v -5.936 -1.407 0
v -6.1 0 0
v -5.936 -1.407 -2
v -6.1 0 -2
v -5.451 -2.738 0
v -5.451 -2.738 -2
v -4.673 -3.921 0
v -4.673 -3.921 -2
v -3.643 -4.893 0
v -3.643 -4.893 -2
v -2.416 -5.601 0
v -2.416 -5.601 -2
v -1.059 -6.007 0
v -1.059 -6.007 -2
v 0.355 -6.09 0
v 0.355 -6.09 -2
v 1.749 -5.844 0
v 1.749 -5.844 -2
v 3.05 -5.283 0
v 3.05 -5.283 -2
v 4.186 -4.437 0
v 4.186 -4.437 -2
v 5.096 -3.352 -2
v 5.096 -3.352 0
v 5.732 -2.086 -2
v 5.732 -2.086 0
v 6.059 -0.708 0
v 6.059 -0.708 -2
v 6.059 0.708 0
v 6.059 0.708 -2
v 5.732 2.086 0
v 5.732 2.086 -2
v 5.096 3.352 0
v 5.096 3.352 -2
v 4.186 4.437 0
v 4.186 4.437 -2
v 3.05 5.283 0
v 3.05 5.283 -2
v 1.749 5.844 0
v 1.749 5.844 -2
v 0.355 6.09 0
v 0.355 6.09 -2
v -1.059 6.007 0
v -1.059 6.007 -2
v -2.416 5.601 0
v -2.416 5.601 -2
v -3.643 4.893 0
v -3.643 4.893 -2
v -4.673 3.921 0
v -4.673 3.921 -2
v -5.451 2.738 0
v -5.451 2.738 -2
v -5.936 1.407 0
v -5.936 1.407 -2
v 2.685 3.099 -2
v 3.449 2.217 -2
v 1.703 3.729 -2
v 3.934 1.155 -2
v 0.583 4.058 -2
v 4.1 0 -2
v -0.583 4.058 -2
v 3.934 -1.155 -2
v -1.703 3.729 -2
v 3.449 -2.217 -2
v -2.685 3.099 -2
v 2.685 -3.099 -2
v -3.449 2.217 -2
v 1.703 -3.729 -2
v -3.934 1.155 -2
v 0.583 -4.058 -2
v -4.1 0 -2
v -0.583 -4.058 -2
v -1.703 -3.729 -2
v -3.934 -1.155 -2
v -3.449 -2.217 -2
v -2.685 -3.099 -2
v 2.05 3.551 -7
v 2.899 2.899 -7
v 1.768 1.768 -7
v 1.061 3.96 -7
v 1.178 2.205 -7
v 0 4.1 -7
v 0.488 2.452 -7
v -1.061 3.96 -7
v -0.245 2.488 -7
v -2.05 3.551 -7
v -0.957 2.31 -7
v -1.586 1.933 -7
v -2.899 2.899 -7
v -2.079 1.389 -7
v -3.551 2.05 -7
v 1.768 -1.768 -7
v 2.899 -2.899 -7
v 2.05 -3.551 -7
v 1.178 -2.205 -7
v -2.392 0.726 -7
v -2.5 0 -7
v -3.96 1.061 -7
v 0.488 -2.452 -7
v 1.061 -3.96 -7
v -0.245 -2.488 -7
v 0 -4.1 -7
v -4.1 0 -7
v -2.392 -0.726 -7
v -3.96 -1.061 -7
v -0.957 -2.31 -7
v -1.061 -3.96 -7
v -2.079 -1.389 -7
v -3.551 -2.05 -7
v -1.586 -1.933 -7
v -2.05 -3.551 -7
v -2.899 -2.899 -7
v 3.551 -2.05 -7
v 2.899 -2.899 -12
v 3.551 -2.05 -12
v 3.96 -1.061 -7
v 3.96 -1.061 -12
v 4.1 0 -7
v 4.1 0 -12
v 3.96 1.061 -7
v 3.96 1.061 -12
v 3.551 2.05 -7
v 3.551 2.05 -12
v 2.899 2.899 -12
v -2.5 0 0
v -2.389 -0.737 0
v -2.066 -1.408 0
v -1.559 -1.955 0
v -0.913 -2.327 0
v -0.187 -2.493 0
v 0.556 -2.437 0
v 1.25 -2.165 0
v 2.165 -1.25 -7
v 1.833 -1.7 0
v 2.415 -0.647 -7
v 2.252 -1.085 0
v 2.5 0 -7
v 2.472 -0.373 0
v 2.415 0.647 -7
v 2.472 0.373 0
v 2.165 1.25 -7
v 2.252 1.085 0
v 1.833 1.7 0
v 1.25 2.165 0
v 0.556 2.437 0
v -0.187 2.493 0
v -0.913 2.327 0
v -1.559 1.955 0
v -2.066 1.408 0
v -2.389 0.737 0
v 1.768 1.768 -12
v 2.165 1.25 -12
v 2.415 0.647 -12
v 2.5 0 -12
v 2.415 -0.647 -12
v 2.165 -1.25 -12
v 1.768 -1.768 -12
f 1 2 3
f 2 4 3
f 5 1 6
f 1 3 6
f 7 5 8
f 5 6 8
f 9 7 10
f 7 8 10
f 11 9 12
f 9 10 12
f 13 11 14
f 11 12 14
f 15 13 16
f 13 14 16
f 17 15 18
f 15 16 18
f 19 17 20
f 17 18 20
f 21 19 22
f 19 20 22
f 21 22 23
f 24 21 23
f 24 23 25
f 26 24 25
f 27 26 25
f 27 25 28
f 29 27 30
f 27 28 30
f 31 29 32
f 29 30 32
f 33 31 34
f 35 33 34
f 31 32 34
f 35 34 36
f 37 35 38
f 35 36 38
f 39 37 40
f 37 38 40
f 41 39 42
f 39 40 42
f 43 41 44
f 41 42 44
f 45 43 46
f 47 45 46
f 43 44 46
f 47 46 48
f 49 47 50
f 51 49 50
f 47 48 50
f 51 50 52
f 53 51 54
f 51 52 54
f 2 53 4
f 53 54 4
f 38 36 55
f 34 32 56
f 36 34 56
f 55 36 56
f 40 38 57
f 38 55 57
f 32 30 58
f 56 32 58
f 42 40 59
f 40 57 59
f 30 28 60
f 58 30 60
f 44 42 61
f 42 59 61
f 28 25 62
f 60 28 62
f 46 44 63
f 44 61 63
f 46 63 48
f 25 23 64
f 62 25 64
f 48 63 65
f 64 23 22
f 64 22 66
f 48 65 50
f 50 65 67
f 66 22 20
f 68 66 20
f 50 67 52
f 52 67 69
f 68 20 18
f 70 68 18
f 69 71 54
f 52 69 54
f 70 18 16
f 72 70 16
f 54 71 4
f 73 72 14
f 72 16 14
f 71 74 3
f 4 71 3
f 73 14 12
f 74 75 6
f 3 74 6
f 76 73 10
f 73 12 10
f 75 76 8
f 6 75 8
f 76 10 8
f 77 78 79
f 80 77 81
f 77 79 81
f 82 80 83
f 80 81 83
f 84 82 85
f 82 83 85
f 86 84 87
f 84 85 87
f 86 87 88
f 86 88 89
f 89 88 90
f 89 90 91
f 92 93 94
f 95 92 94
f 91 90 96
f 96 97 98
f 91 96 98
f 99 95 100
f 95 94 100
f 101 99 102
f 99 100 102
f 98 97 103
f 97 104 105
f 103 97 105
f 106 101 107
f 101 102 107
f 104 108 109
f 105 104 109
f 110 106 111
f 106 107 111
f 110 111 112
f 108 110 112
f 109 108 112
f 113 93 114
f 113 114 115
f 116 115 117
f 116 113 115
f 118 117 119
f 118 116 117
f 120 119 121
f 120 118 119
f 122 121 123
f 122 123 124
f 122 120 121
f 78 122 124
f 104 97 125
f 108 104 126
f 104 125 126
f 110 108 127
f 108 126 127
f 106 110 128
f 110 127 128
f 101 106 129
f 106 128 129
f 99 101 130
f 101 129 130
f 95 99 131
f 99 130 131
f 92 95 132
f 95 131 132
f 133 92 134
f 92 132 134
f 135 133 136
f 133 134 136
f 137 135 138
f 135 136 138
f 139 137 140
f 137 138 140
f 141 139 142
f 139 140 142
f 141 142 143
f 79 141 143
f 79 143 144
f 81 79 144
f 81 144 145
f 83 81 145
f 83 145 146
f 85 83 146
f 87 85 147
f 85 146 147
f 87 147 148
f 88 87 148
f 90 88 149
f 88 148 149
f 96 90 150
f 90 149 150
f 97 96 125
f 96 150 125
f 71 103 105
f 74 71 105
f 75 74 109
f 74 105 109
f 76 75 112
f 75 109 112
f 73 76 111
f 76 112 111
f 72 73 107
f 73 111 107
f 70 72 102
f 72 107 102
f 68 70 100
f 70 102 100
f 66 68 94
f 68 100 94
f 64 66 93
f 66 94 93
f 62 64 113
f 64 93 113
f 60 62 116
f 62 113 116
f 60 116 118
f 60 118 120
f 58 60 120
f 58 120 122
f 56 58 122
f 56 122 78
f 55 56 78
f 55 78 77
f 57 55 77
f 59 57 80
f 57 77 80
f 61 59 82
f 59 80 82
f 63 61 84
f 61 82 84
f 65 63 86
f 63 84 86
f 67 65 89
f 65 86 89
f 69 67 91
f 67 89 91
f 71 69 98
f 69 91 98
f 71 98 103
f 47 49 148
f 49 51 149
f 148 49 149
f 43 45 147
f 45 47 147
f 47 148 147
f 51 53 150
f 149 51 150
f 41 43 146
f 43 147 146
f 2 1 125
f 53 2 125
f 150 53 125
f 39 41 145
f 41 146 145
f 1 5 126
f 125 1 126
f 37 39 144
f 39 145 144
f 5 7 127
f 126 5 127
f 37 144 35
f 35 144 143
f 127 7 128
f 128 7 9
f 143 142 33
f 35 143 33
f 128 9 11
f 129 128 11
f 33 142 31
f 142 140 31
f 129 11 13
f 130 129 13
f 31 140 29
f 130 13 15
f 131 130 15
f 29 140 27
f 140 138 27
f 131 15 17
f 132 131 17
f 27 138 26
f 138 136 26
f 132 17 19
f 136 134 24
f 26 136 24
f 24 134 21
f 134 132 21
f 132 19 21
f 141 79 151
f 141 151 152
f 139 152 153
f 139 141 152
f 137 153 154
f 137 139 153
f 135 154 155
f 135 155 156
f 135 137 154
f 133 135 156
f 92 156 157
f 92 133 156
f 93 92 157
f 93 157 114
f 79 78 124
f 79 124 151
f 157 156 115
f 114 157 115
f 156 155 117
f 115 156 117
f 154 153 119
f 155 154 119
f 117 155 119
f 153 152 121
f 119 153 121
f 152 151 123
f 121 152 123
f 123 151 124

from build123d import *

# Parameters (mm, degrees)
BOSS_EXTRU_1_DEPTH = 5


with BuildPart() as part:
    # Esquisse1 → Révolution1 (revolve)
    with BuildSketch(Plane(origin=(0, 0, 0), x_dir=(1, 0, 0), z_dir=(0, 1, 0))):
        Polygon((-2.5, 0), (-6.1, 0), (-6.1, 2), (-4.1, 2), (-4.1, 7), (-2.5, 7), align=None)
    revolve(axis=Axis((0, 0, -7.597402597), (0, 0, 1)))

    # Esquisse2 → Boss.-Extru.1 (add)
    with BuildSketch(Plane(origin=(0, 0, -7), x_dir=(-1, 0, 0), z_dir=(0, 0, -1))):
        with BuildLine():
            Line((-2.899137803, 2.899137803), (-1.767766953, 1.767766953))
            ThreePointArc((-1.767766953, 1.767766953), (-2.5, 0), (-1.767766953, -1.767766953))
            Line((-1.767766953, -1.767766953), (-2.899137803, -2.899137803))
            ThreePointArc((-2.899137803, -2.899137803), (-4.1, 0), (-2.899137803, 2.899137803))
        make_face()
    extrude(amount=BOSS_EXTRU_1_DEPTH)


solid = part.part
